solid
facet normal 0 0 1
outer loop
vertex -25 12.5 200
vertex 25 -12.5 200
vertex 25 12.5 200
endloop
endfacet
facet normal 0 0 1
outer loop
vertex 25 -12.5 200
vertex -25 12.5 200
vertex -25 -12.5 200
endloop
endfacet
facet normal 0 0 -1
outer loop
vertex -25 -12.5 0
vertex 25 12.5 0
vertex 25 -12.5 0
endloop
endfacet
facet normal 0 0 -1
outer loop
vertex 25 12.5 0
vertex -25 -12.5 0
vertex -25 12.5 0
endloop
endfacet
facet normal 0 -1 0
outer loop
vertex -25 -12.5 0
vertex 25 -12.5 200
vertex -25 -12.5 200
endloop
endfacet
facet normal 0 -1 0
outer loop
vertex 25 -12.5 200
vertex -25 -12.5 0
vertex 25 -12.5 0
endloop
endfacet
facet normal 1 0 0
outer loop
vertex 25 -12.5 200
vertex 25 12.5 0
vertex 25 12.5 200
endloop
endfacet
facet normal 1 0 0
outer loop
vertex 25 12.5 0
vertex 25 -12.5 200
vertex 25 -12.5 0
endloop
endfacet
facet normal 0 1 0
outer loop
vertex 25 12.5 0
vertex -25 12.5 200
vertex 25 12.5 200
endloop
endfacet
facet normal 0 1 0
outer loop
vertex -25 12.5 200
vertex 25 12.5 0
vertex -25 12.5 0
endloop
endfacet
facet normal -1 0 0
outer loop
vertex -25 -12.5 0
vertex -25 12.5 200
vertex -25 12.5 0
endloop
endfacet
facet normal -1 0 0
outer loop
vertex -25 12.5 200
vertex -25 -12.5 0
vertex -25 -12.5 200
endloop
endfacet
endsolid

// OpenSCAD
//cylinder(r=50, h=20, center=true);

height=200;
length=50;

color([0.2, 0.2, 0.2])
{
    translate([0,0,height/2])
    {
        cube([length,length/2,height], center=true);
    }
}
